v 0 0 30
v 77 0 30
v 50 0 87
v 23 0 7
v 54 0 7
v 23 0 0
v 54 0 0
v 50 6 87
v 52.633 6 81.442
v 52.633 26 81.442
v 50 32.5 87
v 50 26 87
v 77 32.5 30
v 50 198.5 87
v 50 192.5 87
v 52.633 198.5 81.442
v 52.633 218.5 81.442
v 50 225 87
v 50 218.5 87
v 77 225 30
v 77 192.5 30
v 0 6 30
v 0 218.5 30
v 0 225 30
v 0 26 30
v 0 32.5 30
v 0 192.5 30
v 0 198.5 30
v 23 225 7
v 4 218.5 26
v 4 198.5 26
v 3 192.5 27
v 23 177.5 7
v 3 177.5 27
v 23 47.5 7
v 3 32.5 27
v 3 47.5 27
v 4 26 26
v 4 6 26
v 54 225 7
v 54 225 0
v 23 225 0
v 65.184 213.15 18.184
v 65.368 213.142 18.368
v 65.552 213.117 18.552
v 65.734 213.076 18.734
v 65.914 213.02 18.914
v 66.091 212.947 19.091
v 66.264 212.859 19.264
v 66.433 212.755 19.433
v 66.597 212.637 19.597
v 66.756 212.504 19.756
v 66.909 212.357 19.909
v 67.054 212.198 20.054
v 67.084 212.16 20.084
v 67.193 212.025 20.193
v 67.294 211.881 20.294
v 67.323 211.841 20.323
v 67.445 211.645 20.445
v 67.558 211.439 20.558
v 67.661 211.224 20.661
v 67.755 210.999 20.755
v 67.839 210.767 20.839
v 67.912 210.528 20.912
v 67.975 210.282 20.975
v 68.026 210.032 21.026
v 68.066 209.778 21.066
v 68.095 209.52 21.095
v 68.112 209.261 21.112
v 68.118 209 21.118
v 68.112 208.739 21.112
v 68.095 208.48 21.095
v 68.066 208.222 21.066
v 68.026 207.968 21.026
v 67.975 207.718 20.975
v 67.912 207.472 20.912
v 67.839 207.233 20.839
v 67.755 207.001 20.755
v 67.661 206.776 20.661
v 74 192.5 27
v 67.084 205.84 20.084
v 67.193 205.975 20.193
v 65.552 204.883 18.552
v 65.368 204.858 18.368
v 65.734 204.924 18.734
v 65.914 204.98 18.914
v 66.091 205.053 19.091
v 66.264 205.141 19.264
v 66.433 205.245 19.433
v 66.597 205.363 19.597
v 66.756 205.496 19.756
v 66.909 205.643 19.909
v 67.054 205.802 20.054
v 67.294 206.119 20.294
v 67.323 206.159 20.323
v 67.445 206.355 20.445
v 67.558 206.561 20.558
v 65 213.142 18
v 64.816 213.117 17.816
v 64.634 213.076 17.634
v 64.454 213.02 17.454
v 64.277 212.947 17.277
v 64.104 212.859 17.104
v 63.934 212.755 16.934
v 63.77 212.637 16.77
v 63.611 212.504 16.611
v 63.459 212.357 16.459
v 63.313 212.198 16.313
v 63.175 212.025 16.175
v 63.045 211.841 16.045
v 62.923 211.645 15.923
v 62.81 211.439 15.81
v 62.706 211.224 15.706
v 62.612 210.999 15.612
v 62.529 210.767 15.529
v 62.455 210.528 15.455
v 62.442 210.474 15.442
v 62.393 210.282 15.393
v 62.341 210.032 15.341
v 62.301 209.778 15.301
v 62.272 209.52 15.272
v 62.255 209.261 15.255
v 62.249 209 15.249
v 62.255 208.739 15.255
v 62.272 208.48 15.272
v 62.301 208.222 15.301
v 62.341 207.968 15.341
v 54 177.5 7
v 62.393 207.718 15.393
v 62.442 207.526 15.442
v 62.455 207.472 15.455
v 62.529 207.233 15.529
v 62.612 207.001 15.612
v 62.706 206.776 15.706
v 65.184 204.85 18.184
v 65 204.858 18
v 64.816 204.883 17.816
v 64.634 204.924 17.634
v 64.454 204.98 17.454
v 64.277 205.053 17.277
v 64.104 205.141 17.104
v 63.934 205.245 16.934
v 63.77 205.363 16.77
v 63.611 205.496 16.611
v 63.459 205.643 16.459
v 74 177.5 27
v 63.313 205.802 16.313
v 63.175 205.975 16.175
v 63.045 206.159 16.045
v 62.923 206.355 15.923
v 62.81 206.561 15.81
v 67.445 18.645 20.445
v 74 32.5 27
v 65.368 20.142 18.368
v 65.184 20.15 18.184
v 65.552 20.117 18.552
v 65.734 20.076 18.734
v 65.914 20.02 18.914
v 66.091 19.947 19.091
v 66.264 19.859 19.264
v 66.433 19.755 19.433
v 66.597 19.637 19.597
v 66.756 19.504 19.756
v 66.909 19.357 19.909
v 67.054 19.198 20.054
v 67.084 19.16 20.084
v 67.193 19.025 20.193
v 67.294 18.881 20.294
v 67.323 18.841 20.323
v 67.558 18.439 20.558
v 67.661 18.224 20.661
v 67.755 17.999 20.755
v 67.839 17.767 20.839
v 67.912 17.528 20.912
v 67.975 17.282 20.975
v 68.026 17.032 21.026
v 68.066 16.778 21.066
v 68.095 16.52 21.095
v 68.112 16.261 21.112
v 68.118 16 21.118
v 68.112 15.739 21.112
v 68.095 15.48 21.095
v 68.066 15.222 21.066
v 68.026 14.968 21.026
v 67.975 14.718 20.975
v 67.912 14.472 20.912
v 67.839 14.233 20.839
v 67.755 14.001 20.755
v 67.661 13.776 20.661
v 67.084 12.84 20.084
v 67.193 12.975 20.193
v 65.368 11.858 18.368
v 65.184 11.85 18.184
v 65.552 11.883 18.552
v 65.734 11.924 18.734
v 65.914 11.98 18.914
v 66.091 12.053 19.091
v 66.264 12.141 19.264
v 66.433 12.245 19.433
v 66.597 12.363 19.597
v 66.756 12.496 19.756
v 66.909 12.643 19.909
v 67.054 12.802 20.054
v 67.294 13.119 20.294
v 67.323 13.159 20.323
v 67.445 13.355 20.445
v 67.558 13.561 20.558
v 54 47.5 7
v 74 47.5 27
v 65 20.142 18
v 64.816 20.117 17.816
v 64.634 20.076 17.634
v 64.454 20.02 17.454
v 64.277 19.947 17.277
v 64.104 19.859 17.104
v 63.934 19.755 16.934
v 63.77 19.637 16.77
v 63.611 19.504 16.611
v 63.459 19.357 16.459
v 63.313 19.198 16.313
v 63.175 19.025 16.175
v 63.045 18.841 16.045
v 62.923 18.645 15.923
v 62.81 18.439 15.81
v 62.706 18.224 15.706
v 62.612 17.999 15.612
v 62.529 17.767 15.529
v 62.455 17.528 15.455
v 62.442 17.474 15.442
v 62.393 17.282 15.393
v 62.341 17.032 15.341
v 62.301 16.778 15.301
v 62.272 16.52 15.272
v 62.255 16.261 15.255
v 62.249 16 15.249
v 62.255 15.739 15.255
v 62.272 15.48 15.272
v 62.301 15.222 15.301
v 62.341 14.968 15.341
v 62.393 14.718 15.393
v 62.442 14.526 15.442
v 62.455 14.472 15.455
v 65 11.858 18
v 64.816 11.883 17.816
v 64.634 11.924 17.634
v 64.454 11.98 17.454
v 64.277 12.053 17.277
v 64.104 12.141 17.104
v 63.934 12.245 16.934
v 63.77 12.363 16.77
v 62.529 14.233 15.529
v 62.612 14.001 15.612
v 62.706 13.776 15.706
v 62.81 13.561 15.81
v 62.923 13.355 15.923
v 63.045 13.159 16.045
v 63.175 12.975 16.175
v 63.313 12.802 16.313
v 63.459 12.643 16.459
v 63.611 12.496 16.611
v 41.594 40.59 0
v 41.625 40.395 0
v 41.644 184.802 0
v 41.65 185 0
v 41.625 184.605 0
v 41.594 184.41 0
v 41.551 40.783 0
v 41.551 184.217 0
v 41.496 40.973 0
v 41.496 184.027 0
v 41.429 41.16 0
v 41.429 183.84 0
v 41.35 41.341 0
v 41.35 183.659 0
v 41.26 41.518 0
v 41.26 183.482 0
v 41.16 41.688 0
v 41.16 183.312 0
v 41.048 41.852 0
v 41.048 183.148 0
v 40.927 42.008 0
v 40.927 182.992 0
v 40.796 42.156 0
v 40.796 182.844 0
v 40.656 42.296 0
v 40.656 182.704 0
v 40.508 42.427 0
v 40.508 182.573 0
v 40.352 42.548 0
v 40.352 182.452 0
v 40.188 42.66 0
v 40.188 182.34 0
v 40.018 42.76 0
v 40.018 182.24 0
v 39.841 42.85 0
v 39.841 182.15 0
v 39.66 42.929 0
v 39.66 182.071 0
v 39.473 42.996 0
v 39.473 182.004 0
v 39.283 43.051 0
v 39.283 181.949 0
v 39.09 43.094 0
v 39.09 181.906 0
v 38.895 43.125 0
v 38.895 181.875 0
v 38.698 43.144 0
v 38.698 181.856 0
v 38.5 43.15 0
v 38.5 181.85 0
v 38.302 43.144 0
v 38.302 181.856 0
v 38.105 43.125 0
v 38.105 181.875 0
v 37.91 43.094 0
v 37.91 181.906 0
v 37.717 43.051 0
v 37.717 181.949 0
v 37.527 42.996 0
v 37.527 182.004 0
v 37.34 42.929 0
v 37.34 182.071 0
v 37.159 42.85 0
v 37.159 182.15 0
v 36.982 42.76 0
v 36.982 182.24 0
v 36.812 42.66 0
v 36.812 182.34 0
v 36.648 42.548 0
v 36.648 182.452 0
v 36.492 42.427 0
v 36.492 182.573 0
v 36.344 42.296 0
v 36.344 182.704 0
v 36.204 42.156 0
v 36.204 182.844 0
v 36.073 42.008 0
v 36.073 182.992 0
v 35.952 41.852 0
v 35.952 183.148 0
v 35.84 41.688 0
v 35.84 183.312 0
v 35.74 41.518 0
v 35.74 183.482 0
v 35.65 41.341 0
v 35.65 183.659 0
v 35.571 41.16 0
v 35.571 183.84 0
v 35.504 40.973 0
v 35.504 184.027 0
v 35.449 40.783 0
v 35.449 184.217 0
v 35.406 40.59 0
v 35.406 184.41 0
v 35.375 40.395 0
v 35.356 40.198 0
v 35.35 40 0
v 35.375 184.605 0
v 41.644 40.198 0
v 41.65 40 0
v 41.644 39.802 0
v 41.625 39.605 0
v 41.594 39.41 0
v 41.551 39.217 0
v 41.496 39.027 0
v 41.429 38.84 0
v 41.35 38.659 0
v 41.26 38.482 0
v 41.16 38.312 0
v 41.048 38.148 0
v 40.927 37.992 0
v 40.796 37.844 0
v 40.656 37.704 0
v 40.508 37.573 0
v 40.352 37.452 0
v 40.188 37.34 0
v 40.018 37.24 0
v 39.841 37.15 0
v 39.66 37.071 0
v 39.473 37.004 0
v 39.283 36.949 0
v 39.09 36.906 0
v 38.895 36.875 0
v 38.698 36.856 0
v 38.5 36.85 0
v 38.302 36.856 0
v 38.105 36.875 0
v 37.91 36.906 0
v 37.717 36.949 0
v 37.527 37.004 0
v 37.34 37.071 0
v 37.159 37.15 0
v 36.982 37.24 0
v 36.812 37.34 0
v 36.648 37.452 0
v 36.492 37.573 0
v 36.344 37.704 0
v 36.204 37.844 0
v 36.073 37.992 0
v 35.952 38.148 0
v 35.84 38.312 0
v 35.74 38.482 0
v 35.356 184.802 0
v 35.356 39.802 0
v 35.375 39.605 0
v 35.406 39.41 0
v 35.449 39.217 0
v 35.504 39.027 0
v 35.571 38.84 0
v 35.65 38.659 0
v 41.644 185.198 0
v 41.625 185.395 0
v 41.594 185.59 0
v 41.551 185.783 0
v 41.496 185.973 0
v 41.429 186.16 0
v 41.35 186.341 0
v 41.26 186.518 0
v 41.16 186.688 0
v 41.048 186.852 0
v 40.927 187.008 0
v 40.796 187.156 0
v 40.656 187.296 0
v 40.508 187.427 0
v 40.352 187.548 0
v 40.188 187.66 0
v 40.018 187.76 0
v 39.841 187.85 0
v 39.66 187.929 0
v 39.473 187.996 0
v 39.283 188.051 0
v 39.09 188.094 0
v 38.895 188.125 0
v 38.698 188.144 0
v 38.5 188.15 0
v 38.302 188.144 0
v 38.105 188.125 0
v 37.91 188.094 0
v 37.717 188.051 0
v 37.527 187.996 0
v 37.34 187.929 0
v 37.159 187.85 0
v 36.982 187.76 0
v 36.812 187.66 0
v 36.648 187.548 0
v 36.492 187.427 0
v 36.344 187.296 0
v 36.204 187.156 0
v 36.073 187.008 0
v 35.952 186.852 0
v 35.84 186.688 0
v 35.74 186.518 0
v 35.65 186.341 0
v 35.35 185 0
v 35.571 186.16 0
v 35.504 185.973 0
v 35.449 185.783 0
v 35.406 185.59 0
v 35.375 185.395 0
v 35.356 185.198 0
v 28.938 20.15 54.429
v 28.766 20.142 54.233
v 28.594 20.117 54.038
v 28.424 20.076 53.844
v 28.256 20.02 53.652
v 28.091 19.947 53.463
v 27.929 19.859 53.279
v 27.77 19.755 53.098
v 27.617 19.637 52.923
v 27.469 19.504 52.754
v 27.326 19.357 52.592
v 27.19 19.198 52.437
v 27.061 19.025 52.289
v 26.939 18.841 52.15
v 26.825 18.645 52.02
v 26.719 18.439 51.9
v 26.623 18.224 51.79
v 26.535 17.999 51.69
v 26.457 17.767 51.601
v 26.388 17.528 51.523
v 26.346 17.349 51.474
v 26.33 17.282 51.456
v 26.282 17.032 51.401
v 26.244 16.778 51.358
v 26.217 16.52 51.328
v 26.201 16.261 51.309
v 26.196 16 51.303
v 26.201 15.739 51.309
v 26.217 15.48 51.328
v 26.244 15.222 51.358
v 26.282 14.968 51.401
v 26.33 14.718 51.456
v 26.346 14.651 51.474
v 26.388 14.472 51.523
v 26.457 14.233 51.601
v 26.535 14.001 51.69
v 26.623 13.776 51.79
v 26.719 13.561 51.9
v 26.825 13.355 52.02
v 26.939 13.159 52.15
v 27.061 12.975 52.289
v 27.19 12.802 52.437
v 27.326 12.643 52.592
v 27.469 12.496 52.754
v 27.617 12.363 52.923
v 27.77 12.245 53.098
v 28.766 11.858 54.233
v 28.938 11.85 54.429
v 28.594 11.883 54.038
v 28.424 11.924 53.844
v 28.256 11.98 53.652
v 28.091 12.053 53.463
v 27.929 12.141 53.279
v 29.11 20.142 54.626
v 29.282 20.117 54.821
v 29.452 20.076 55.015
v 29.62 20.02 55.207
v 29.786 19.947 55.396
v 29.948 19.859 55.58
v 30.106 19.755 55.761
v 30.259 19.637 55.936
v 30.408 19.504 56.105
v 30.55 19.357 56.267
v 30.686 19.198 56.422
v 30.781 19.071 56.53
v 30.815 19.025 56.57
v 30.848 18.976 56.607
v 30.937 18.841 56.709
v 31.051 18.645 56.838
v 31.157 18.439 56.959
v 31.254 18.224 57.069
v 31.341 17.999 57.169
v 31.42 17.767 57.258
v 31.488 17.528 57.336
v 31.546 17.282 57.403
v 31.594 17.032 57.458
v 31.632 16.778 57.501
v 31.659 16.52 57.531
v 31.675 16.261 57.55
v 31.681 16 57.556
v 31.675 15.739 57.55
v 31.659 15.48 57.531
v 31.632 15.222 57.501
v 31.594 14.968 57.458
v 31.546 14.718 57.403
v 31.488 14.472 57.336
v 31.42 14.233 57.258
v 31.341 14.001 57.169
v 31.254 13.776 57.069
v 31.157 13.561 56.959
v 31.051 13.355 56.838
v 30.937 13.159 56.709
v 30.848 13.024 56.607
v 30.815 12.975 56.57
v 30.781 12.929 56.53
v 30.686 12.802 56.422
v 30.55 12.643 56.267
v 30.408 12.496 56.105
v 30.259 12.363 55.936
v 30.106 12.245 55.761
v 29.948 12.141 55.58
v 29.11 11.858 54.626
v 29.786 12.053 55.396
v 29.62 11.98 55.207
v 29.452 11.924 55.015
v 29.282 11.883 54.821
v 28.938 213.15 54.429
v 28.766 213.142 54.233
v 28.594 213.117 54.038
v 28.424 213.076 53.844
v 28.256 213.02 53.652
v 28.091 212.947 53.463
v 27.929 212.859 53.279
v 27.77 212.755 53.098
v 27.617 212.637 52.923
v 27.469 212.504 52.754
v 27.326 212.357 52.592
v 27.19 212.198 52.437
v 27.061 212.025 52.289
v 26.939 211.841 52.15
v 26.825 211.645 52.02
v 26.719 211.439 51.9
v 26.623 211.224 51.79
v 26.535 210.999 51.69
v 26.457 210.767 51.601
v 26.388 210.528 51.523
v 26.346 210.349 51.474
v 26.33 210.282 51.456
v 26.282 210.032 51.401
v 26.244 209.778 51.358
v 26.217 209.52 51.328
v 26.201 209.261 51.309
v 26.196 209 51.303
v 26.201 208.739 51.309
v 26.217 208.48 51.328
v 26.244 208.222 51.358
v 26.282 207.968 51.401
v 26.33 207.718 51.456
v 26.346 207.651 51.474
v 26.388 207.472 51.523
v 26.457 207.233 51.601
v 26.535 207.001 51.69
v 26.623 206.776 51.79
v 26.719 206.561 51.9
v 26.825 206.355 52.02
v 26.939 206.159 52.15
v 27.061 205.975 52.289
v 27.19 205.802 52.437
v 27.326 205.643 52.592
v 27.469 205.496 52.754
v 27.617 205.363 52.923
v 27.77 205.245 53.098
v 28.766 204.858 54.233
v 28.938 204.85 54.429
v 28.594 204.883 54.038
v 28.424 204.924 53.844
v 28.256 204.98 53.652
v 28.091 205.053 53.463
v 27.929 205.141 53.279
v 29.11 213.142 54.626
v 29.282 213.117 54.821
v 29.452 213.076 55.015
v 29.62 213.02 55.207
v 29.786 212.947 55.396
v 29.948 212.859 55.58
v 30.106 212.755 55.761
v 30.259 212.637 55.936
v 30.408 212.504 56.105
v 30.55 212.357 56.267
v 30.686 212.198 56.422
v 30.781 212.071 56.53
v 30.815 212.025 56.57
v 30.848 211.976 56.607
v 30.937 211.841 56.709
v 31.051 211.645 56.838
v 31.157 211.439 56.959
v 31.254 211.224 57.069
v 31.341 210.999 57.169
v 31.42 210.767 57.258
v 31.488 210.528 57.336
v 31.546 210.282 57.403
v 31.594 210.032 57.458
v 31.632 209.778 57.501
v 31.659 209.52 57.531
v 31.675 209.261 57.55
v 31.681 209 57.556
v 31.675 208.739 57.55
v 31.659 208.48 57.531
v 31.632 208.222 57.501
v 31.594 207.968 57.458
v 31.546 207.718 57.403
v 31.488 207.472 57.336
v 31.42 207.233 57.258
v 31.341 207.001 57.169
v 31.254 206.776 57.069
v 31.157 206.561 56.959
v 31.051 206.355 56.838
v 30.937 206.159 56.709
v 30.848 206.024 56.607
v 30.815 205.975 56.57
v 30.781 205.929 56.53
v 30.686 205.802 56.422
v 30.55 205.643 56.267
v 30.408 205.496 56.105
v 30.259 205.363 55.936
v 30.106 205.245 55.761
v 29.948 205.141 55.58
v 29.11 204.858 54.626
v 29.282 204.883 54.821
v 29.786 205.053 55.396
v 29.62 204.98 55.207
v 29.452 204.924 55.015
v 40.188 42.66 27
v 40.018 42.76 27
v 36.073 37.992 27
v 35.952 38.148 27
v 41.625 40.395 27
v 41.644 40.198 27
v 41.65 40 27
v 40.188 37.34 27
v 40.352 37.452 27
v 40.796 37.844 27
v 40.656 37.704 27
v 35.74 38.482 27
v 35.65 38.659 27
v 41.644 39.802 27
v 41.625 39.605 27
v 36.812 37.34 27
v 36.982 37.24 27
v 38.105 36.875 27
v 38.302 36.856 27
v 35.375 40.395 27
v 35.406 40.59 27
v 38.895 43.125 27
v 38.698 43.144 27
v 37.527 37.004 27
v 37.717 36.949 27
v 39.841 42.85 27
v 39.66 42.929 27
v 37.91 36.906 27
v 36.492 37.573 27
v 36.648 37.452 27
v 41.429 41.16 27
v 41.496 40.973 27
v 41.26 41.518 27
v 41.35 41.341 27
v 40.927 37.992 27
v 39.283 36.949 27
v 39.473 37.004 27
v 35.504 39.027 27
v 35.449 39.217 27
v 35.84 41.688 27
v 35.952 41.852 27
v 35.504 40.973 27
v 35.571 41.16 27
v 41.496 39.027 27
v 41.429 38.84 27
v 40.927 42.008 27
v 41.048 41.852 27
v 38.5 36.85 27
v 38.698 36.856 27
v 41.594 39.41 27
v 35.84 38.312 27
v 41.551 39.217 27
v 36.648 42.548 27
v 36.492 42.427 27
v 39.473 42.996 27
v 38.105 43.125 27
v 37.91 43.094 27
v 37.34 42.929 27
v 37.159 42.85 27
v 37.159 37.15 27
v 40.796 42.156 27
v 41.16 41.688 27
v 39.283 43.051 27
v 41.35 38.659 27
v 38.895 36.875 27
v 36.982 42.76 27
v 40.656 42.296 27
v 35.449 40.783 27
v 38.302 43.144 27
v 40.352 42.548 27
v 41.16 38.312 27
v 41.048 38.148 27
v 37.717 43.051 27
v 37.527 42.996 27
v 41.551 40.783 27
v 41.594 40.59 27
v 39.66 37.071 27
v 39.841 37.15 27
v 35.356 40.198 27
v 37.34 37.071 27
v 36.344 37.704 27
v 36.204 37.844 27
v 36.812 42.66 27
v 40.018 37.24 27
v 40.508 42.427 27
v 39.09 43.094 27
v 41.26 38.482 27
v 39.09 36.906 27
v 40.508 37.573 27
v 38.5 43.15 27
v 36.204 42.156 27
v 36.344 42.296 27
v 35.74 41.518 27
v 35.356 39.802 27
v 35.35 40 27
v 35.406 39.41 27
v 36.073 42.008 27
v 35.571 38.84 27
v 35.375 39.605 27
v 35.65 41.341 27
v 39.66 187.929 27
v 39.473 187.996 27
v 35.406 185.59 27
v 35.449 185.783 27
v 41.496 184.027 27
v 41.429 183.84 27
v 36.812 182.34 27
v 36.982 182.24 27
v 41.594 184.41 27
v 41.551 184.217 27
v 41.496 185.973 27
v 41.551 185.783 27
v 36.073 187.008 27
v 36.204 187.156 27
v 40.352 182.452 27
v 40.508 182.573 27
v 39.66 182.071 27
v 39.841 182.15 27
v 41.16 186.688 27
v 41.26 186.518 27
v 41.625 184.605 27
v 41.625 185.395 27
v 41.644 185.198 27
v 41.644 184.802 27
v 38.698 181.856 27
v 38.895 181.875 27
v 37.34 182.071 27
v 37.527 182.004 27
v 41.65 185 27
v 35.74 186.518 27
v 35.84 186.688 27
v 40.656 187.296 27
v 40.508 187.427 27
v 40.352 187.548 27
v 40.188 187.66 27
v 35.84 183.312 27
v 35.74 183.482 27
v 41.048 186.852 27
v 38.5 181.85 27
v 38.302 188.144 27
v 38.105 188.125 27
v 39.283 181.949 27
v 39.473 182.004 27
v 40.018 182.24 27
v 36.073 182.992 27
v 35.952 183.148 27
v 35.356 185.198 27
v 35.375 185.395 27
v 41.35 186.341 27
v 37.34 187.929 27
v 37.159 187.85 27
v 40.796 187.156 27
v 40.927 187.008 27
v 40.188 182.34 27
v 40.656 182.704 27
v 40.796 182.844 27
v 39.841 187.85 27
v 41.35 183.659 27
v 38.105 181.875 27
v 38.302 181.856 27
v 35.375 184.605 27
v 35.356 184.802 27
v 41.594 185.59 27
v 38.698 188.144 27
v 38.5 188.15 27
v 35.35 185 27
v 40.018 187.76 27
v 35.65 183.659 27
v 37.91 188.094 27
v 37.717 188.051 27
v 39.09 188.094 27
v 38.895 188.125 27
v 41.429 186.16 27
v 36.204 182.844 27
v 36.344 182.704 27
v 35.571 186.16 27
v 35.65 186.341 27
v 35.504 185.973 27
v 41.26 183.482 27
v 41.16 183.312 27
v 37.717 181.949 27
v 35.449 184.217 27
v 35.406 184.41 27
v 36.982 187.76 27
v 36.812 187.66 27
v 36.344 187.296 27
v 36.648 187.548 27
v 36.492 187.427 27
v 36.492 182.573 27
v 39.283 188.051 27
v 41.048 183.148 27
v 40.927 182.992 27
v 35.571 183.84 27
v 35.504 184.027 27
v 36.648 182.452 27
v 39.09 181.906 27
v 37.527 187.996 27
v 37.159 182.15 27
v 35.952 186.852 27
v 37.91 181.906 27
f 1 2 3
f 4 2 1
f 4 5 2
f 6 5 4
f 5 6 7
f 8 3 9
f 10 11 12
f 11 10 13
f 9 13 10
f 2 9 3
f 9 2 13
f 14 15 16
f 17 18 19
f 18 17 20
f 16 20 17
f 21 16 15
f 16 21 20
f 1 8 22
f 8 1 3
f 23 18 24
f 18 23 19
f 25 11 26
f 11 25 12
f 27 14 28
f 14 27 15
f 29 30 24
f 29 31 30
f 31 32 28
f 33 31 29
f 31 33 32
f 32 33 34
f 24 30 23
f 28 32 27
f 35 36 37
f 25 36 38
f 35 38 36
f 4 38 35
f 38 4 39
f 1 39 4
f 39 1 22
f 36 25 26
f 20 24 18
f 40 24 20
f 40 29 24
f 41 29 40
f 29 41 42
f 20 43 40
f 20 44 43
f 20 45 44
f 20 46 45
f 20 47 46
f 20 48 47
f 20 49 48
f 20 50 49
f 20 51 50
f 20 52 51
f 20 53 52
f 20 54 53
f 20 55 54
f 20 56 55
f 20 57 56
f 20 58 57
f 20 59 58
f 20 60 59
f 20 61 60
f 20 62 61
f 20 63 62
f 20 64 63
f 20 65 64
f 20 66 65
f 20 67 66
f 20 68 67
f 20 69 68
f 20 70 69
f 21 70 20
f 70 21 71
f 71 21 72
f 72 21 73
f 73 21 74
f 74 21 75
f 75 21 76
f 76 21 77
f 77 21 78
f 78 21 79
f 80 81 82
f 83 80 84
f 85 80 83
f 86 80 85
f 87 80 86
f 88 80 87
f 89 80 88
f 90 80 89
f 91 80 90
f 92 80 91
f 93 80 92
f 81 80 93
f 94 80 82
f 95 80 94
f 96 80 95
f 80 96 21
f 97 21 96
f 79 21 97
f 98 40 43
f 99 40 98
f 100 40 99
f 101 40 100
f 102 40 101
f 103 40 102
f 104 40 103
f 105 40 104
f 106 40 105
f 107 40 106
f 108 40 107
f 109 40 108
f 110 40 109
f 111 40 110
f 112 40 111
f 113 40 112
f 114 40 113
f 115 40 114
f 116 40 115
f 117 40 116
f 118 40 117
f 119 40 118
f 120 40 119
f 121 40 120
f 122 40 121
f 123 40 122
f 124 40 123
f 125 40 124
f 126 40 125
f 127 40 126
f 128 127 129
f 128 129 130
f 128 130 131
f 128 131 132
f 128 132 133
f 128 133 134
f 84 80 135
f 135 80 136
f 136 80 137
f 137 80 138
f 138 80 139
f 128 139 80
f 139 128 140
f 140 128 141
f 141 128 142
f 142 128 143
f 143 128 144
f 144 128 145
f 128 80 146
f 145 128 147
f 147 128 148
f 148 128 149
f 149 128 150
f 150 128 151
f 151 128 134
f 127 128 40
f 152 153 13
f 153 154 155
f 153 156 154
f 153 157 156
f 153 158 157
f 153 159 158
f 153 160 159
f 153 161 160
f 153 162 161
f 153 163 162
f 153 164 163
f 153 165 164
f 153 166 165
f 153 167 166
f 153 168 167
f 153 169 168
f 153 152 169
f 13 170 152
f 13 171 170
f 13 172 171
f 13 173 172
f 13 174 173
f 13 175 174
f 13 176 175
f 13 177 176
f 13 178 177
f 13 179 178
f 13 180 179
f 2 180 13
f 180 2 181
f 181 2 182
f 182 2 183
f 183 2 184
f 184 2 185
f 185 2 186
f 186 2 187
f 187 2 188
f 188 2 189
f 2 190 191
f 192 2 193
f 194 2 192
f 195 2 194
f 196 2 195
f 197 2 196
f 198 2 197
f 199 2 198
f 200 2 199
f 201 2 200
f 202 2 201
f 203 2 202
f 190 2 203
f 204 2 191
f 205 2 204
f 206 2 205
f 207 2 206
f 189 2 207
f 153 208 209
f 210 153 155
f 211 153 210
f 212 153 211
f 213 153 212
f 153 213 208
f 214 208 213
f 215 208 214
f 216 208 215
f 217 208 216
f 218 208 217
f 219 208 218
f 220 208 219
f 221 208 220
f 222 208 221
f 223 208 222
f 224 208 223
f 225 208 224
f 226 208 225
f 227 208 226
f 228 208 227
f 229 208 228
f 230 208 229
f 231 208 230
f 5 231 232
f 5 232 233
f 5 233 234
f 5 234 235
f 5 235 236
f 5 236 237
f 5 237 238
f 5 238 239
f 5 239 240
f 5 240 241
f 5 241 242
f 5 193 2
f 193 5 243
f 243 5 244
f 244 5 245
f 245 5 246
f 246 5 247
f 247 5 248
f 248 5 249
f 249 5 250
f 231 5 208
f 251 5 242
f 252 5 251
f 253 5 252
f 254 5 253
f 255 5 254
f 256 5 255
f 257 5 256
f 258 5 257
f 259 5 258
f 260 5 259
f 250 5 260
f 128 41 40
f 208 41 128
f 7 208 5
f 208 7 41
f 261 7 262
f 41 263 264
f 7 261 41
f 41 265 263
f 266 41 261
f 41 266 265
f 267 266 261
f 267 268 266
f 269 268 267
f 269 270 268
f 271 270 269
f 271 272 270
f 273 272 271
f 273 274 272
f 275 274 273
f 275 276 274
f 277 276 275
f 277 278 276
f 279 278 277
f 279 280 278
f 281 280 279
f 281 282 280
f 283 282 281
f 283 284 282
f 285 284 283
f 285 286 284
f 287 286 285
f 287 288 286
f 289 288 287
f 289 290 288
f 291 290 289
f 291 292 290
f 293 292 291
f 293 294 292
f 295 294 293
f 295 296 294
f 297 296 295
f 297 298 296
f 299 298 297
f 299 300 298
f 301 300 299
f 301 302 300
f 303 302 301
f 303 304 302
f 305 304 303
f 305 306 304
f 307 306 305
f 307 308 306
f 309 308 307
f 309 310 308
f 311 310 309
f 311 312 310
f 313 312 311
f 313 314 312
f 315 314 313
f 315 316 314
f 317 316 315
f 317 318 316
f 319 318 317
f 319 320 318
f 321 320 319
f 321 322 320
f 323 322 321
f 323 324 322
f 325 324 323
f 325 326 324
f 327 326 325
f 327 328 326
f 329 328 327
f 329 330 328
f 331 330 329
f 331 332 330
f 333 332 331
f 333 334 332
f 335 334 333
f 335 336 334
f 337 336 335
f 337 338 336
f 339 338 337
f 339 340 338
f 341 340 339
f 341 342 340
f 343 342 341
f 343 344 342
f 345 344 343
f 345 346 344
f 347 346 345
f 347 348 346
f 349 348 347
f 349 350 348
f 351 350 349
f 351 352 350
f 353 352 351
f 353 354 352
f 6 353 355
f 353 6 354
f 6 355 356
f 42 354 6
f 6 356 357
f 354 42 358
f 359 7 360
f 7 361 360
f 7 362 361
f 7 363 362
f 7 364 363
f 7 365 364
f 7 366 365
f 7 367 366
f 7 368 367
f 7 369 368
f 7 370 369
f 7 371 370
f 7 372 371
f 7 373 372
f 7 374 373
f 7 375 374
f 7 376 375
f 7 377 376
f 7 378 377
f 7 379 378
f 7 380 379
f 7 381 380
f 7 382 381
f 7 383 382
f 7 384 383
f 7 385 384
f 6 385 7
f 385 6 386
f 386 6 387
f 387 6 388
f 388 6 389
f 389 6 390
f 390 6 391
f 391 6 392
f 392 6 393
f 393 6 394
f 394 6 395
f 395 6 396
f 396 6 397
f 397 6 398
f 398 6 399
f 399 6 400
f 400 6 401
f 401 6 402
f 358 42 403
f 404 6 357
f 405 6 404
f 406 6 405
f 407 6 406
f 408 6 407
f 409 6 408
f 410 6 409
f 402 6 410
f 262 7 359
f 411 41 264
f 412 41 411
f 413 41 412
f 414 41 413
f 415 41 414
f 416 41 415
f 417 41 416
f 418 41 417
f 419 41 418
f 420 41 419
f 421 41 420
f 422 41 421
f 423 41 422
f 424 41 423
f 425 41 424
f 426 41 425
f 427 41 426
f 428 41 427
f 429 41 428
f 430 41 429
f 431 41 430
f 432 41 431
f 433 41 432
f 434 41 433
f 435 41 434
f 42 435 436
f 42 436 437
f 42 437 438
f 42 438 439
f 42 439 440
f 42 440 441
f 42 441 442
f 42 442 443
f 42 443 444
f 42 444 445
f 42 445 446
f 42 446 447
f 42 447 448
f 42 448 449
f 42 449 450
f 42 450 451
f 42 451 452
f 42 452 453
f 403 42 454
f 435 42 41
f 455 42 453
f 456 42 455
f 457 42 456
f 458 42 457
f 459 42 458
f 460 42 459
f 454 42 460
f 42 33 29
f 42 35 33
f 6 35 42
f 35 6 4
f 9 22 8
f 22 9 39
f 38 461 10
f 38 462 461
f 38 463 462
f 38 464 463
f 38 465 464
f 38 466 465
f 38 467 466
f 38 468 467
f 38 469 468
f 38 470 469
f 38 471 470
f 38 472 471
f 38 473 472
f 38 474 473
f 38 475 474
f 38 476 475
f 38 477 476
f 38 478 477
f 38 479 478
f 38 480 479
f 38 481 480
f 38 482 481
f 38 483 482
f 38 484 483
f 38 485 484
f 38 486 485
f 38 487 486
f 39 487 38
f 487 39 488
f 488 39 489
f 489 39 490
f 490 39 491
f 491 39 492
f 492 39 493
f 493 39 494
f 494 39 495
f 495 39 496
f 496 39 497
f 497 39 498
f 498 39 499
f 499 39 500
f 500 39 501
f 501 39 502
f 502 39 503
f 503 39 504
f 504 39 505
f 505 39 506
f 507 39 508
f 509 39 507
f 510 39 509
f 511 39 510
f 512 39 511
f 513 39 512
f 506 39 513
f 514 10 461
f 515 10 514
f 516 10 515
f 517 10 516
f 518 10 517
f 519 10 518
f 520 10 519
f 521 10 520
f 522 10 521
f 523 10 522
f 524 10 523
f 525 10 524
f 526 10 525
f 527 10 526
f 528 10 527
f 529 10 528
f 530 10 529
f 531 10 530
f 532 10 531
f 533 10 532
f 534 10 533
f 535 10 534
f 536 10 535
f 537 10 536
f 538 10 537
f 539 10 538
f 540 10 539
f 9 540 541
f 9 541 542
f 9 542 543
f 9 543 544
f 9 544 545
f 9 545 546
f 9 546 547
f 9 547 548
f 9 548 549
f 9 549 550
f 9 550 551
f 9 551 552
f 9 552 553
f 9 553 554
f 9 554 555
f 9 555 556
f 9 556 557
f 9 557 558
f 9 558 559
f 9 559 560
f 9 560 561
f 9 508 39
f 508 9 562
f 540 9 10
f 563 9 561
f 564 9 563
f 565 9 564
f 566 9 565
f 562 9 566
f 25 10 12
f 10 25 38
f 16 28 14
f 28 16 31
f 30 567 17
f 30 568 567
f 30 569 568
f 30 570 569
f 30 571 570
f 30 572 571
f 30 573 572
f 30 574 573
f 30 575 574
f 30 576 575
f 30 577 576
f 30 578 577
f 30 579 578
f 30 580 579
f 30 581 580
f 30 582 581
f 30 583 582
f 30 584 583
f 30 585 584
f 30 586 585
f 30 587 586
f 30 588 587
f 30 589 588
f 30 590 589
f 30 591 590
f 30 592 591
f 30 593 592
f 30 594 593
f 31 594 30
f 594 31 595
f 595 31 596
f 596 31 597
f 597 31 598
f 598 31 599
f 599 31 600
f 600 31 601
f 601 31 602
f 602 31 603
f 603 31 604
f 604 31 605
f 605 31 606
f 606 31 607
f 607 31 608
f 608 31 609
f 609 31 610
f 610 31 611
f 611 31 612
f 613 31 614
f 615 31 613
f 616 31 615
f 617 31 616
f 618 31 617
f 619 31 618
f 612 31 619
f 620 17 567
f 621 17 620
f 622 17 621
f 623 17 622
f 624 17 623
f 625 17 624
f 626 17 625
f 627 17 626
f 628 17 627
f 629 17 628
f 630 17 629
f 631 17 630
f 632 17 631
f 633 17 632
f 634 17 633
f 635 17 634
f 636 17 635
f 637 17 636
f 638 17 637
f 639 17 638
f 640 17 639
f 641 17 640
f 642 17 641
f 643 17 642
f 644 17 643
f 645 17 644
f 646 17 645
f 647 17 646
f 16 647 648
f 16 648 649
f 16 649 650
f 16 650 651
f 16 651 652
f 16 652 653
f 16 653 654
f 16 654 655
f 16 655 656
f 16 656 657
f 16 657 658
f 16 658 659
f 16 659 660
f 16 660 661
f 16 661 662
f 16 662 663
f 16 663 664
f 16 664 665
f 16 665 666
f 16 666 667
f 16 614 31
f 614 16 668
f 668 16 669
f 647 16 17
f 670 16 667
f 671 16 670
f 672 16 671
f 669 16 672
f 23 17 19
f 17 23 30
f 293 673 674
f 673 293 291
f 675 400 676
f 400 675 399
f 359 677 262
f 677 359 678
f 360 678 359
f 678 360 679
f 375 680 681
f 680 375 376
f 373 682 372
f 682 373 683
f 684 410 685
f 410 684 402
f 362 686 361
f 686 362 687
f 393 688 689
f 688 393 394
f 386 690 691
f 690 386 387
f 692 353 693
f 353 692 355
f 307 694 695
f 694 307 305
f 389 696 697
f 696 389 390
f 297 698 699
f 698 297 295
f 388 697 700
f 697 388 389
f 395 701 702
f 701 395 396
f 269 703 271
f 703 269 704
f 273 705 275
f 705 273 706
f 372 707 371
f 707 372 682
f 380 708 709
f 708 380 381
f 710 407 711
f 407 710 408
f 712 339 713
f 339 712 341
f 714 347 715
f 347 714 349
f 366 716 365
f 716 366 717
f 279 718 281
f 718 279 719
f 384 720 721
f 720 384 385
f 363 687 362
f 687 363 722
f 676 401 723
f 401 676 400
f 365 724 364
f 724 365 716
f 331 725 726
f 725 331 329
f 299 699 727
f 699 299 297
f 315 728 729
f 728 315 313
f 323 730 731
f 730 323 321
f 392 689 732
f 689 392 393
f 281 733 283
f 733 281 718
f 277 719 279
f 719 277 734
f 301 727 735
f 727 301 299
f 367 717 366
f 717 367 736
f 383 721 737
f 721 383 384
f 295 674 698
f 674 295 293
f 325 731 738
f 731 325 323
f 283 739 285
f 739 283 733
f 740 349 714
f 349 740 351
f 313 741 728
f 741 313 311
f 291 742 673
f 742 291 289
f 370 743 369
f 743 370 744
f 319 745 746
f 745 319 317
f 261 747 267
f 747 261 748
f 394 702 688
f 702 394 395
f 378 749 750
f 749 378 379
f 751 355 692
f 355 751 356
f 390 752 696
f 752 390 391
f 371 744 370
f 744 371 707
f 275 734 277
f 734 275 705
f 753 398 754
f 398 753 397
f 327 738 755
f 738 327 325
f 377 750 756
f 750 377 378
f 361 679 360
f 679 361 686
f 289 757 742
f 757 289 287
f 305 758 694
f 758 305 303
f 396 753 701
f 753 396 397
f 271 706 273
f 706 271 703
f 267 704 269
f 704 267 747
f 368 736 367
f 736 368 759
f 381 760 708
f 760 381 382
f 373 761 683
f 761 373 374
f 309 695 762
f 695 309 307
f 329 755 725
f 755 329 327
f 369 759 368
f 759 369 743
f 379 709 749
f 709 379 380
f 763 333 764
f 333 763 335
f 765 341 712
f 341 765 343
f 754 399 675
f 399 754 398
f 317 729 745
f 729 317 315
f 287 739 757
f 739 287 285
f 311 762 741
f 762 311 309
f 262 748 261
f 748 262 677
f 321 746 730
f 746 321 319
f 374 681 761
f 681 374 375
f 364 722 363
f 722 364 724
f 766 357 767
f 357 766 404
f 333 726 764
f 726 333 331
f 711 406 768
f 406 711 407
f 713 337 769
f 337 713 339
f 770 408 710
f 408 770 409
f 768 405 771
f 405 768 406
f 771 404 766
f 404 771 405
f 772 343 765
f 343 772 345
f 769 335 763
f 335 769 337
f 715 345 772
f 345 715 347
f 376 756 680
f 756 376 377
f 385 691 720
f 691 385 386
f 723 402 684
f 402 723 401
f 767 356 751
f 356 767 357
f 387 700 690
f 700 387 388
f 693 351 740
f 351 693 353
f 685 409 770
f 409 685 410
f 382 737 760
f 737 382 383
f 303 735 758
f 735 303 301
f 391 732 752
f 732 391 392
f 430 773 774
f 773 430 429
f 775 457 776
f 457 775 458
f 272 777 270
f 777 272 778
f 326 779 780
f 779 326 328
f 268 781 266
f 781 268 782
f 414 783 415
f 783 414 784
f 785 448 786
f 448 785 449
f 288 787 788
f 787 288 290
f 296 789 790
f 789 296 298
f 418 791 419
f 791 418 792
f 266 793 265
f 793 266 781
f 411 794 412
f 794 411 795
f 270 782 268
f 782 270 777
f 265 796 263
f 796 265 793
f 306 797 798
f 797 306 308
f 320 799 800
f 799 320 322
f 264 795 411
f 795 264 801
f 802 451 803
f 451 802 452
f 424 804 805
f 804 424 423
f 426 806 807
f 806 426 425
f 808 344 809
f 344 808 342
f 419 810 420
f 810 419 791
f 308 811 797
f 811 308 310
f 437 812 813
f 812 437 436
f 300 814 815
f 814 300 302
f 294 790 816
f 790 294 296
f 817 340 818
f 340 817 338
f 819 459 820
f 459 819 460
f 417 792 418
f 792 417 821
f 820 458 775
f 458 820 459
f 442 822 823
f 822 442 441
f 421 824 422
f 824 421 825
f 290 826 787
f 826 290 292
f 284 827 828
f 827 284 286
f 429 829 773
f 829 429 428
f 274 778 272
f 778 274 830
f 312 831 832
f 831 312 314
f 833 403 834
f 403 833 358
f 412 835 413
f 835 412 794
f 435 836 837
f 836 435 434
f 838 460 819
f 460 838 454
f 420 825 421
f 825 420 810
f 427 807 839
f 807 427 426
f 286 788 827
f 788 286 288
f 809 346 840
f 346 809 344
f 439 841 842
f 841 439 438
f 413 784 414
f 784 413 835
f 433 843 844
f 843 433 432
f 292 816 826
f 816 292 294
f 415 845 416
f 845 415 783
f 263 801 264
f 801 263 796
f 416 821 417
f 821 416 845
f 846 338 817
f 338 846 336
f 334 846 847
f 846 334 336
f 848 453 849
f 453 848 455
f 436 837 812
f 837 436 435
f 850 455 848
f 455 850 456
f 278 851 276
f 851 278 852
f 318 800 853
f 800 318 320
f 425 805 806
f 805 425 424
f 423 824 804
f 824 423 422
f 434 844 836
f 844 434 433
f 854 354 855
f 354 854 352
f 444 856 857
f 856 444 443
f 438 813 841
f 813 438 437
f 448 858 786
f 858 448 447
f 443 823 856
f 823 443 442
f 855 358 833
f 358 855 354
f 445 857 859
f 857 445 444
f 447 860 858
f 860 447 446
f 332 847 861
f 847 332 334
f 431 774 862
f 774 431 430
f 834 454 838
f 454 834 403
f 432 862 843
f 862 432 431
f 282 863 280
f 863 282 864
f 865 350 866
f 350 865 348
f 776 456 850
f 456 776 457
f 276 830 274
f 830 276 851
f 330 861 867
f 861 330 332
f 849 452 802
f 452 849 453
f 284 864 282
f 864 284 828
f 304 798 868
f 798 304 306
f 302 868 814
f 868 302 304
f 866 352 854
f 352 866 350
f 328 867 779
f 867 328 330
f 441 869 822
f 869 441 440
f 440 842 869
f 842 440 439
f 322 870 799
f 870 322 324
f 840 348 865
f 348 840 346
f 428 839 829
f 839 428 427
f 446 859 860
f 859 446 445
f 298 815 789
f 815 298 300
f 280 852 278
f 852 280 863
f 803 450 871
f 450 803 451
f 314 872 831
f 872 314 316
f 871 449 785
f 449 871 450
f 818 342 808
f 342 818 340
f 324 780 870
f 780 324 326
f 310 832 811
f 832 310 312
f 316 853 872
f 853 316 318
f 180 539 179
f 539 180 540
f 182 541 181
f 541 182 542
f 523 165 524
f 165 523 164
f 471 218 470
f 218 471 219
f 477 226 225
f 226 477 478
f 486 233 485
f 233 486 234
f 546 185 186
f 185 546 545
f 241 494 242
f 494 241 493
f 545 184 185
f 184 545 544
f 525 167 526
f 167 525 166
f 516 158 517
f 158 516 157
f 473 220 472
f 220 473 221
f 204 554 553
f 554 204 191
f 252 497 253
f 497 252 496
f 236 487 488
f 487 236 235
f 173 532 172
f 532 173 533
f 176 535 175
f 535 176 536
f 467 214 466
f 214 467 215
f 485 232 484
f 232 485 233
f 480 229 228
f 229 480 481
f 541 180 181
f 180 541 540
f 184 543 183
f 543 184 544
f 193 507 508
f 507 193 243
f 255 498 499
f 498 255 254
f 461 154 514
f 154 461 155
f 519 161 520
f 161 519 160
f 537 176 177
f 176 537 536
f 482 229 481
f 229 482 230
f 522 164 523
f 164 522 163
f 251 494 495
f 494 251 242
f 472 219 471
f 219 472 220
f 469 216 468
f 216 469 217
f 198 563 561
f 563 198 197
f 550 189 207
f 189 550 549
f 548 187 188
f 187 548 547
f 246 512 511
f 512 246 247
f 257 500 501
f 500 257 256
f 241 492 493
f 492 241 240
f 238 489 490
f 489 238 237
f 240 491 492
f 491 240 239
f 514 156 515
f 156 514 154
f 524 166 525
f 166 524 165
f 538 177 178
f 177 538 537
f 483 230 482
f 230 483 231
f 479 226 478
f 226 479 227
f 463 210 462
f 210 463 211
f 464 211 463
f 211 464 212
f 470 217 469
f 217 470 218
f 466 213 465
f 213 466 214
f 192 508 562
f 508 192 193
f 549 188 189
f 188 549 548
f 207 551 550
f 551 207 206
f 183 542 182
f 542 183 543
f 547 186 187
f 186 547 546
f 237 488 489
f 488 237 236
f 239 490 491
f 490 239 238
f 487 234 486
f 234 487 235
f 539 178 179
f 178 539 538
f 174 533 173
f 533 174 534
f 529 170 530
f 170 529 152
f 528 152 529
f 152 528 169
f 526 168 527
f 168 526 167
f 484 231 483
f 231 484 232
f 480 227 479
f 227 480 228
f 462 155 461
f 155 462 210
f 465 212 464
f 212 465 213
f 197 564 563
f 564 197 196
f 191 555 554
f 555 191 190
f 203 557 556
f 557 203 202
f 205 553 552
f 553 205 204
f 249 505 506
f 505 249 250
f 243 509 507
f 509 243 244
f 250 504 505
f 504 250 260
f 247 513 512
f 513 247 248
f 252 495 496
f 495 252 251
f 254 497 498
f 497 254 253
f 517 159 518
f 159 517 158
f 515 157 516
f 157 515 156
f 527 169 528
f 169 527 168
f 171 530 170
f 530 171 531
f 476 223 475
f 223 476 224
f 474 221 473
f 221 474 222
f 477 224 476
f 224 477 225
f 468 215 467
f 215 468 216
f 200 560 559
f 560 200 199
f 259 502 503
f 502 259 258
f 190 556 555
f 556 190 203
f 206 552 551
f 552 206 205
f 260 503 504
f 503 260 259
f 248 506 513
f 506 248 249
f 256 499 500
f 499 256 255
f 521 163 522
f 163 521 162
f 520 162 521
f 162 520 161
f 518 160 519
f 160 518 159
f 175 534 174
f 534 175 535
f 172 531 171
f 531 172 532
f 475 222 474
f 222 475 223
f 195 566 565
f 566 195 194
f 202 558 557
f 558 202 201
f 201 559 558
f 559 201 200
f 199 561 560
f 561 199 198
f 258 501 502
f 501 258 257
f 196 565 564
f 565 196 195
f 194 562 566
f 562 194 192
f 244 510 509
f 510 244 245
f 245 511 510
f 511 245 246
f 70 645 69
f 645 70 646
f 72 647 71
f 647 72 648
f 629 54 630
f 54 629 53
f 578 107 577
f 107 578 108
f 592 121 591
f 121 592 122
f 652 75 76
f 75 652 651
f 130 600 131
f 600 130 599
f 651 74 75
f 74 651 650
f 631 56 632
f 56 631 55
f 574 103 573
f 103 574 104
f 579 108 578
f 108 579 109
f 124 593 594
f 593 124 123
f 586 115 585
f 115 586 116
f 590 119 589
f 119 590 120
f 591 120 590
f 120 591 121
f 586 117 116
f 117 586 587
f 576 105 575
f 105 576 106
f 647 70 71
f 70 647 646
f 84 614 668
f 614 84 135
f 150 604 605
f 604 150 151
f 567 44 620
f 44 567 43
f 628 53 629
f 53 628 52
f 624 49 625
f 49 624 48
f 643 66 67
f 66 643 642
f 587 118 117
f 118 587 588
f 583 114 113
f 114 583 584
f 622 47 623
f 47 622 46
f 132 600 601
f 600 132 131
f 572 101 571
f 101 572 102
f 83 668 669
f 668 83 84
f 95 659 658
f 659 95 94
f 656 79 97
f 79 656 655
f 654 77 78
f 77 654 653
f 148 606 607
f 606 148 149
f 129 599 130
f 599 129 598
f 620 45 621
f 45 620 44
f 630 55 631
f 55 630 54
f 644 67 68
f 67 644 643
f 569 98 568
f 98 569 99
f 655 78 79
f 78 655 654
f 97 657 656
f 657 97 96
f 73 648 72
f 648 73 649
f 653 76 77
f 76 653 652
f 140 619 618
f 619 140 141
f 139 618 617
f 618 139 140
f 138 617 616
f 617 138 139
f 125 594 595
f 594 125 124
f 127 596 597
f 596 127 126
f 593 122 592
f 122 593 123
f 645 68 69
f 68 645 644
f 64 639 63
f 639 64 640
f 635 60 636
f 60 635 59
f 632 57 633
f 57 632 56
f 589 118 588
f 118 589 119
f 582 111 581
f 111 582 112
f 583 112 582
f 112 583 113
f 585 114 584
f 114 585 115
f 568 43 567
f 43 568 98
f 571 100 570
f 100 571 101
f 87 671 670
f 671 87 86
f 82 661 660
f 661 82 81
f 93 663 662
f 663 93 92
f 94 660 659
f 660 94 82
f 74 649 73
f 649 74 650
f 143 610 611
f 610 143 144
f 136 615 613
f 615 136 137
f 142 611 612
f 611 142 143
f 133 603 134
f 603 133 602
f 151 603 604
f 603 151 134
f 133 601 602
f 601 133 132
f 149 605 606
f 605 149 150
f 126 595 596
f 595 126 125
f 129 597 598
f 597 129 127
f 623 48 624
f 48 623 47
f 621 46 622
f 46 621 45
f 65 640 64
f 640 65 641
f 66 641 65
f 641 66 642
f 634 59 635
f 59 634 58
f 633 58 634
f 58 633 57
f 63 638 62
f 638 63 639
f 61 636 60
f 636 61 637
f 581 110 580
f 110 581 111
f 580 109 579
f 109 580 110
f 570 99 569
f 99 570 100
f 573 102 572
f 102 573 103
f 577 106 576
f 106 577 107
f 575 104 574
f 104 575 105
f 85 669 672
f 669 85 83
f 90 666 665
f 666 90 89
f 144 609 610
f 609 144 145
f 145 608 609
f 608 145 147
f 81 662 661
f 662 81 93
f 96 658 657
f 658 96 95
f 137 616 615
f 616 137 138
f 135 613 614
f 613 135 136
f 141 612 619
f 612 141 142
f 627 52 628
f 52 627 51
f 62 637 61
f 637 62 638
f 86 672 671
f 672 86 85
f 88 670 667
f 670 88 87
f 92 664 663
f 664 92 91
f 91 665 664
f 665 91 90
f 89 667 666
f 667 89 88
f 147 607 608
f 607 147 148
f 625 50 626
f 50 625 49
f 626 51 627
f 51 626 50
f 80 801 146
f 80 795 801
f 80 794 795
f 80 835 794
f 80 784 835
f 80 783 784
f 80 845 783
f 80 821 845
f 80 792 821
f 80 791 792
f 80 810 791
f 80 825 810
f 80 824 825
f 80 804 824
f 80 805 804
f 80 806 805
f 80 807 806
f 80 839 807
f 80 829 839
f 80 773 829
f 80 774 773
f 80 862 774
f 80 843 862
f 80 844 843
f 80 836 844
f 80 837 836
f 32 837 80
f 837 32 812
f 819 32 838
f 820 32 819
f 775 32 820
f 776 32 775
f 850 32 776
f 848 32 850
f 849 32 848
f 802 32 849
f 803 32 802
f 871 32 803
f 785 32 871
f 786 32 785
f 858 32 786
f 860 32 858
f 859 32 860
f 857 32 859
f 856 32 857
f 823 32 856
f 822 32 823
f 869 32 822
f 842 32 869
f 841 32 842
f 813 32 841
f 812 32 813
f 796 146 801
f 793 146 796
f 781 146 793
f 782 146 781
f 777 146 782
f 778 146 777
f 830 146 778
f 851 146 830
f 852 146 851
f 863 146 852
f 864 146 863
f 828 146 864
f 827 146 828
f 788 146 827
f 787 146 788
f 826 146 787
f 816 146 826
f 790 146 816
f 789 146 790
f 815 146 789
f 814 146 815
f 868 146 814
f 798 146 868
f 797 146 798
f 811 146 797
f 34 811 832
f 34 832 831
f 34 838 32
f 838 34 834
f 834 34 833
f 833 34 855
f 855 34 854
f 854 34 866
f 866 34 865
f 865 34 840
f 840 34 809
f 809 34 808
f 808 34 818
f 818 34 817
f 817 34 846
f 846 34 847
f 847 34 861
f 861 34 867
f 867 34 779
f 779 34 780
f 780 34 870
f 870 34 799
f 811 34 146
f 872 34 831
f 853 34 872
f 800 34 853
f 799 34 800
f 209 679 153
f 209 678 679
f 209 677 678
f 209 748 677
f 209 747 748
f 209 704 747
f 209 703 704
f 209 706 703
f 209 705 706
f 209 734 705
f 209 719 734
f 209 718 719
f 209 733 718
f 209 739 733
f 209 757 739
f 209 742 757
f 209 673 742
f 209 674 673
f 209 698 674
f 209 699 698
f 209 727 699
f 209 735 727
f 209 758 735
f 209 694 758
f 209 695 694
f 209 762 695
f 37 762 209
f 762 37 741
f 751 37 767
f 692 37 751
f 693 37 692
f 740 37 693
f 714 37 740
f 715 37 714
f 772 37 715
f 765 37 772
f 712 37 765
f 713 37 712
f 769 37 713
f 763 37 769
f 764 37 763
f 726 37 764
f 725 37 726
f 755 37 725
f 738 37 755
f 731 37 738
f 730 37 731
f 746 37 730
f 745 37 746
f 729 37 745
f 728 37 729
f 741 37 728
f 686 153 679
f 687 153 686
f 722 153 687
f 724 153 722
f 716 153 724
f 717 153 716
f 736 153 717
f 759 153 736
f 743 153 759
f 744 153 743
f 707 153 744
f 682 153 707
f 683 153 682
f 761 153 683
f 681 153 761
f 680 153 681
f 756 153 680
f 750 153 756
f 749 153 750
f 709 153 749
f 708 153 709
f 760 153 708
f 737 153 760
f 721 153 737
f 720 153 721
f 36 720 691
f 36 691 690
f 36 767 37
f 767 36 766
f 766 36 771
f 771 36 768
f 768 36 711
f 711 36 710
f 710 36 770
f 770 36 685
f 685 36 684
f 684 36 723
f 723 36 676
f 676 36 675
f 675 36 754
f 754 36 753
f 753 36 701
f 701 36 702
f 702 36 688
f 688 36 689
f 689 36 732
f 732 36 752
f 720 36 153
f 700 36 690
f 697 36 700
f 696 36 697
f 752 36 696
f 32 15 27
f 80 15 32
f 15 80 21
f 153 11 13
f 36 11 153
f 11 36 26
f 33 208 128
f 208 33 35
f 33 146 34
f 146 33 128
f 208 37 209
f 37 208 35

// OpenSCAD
cone_x1=31;
cone_x2=77;
cone_x3=50;
cone_y=225;
cone_h = 23;
cone_h2 = 80;
mscrew_y=145;
screw_cent_d=8.3;
screw_d=6.3;
ring_y=20;
toler=0.6;
bspace=6;
bcube_h=7;
sub_y=160;
sub_y2=130;
d=-100;
cut_h=4;

module rect_cut(){
    polyhedron(
        points=[
                [0,bspace,cone_h+bcube_h],
                [cone_x3,bspace,cone_h2+bcube_h],
                [cone_x3,bspace+ring_y,cone_h2+bcube_h],
                [0,bspace+ring_y,cone_h+bcube_h],

                [0+cut_h,bspace,cone_h+bcube_h-cut_h],
                [cone_x3+cut_h,bspace,cone_h2+bcube_h-cut_h],
                [cone_x3+cut_h,bspace+ring_y,cone_h2+bcube_h-cut_h],
                [0+cut_h,bspace+ring_y,cone_h+bcube_h-cut_h],
                ],
        faces =[
                [0,3,2,1],
                [1,2,6,5],
                [5,6,7,4],
                [0,4,7,3],
                [0,1,5,4],
                [2,3,7,6],
    ]);
}

difference() {
    union() {
        polyhedron(
            points=[[(cone_x2-cone_x1)/2,0,bcube_h],
                    [cone_x2-(cone_x2-cone_x1)/2,0,bcube_h],
                    [cone_x2-(cone_x2-cone_x1)/2,cone_y,bcube_h],
                    [(cone_x2-cone_x1)/2,cone_y,bcube_h],
                    [0,0,cone_h+bcube_h],
                    [cone_x2,0,cone_h+bcube_h],
                    [cone_x3,0,cone_h2+bcube_h],
                    [cone_x2,cone_y,cone_h+bcube_h],
                    [cone_x3,cone_y,cone_h2+bcube_h],
                    [0,cone_y,cone_h+bcube_h]
                    ]
                    ,
            faces =[[0,1,2,3],
                    [4,6,5,1,0],
                    [5,7,2,1],
                    [6,8,7,5],
                    [9,8,6,4],
                    [3,9,4,0],
                    [2,7,8,9,3]
        ]);
        translate([(cone_x2-cone_x1)/2, 0, 0]) cube([cone_x1,cone_y,bcube_h]);
    }
    rect_cut();
    translate([0, (cone_y+sub_y)/2, 0]) rect_cut();
    
    /*
    translate([-1, bspace, cone_h+bcube_h-4]) cube([cone_x2+2,ring_y+toler,4]);
    translate([-1, cone_y-bspace-ring_y, cone_h+bcube_h-4]) cube([cone_x2+2,ring_y+toler,4]);
    */
    translate([cone_x2/2, (cone_y-mscrew_y)/2, -10]) rotate([0, 0, 0]) cylinder(d=screw_d, h=50, $fn=100);
    translate([cone_x2/2, cone_y-(cone_y-mscrew_y)/2, -10]) rotate([0, 0, 0]) cylinder(d=screw_d, h=50, $fn=100);
    translate([0, bspace+ring_y/2, bcube_h]) rotate([0, -45, 0]) translate([cone_x2-(cone_x2-cone_x1)/2,0,-60]) cylinder(d=screw_cent_d, h=100, $fn=100);
    translate([0, cone_y-(bspace+ring_y/2), bcube_h]) rotate([0, -45, 0]) translate([cone_x2-(cone_x2-cone_x1)/2,0,-60]) cylinder(d=screw_cent_d, h=100, $fn=100);
    translate([0, (cone_y-sub_y)/2, cone_h2+bcube_h-60]) cube([cone_x2,sub_y,60]);
    translate([0, (cone_y-sub_y2)/2, cone_h2+bcube_h-80]) cube([cone_x2,sub_y2,80]);
}
